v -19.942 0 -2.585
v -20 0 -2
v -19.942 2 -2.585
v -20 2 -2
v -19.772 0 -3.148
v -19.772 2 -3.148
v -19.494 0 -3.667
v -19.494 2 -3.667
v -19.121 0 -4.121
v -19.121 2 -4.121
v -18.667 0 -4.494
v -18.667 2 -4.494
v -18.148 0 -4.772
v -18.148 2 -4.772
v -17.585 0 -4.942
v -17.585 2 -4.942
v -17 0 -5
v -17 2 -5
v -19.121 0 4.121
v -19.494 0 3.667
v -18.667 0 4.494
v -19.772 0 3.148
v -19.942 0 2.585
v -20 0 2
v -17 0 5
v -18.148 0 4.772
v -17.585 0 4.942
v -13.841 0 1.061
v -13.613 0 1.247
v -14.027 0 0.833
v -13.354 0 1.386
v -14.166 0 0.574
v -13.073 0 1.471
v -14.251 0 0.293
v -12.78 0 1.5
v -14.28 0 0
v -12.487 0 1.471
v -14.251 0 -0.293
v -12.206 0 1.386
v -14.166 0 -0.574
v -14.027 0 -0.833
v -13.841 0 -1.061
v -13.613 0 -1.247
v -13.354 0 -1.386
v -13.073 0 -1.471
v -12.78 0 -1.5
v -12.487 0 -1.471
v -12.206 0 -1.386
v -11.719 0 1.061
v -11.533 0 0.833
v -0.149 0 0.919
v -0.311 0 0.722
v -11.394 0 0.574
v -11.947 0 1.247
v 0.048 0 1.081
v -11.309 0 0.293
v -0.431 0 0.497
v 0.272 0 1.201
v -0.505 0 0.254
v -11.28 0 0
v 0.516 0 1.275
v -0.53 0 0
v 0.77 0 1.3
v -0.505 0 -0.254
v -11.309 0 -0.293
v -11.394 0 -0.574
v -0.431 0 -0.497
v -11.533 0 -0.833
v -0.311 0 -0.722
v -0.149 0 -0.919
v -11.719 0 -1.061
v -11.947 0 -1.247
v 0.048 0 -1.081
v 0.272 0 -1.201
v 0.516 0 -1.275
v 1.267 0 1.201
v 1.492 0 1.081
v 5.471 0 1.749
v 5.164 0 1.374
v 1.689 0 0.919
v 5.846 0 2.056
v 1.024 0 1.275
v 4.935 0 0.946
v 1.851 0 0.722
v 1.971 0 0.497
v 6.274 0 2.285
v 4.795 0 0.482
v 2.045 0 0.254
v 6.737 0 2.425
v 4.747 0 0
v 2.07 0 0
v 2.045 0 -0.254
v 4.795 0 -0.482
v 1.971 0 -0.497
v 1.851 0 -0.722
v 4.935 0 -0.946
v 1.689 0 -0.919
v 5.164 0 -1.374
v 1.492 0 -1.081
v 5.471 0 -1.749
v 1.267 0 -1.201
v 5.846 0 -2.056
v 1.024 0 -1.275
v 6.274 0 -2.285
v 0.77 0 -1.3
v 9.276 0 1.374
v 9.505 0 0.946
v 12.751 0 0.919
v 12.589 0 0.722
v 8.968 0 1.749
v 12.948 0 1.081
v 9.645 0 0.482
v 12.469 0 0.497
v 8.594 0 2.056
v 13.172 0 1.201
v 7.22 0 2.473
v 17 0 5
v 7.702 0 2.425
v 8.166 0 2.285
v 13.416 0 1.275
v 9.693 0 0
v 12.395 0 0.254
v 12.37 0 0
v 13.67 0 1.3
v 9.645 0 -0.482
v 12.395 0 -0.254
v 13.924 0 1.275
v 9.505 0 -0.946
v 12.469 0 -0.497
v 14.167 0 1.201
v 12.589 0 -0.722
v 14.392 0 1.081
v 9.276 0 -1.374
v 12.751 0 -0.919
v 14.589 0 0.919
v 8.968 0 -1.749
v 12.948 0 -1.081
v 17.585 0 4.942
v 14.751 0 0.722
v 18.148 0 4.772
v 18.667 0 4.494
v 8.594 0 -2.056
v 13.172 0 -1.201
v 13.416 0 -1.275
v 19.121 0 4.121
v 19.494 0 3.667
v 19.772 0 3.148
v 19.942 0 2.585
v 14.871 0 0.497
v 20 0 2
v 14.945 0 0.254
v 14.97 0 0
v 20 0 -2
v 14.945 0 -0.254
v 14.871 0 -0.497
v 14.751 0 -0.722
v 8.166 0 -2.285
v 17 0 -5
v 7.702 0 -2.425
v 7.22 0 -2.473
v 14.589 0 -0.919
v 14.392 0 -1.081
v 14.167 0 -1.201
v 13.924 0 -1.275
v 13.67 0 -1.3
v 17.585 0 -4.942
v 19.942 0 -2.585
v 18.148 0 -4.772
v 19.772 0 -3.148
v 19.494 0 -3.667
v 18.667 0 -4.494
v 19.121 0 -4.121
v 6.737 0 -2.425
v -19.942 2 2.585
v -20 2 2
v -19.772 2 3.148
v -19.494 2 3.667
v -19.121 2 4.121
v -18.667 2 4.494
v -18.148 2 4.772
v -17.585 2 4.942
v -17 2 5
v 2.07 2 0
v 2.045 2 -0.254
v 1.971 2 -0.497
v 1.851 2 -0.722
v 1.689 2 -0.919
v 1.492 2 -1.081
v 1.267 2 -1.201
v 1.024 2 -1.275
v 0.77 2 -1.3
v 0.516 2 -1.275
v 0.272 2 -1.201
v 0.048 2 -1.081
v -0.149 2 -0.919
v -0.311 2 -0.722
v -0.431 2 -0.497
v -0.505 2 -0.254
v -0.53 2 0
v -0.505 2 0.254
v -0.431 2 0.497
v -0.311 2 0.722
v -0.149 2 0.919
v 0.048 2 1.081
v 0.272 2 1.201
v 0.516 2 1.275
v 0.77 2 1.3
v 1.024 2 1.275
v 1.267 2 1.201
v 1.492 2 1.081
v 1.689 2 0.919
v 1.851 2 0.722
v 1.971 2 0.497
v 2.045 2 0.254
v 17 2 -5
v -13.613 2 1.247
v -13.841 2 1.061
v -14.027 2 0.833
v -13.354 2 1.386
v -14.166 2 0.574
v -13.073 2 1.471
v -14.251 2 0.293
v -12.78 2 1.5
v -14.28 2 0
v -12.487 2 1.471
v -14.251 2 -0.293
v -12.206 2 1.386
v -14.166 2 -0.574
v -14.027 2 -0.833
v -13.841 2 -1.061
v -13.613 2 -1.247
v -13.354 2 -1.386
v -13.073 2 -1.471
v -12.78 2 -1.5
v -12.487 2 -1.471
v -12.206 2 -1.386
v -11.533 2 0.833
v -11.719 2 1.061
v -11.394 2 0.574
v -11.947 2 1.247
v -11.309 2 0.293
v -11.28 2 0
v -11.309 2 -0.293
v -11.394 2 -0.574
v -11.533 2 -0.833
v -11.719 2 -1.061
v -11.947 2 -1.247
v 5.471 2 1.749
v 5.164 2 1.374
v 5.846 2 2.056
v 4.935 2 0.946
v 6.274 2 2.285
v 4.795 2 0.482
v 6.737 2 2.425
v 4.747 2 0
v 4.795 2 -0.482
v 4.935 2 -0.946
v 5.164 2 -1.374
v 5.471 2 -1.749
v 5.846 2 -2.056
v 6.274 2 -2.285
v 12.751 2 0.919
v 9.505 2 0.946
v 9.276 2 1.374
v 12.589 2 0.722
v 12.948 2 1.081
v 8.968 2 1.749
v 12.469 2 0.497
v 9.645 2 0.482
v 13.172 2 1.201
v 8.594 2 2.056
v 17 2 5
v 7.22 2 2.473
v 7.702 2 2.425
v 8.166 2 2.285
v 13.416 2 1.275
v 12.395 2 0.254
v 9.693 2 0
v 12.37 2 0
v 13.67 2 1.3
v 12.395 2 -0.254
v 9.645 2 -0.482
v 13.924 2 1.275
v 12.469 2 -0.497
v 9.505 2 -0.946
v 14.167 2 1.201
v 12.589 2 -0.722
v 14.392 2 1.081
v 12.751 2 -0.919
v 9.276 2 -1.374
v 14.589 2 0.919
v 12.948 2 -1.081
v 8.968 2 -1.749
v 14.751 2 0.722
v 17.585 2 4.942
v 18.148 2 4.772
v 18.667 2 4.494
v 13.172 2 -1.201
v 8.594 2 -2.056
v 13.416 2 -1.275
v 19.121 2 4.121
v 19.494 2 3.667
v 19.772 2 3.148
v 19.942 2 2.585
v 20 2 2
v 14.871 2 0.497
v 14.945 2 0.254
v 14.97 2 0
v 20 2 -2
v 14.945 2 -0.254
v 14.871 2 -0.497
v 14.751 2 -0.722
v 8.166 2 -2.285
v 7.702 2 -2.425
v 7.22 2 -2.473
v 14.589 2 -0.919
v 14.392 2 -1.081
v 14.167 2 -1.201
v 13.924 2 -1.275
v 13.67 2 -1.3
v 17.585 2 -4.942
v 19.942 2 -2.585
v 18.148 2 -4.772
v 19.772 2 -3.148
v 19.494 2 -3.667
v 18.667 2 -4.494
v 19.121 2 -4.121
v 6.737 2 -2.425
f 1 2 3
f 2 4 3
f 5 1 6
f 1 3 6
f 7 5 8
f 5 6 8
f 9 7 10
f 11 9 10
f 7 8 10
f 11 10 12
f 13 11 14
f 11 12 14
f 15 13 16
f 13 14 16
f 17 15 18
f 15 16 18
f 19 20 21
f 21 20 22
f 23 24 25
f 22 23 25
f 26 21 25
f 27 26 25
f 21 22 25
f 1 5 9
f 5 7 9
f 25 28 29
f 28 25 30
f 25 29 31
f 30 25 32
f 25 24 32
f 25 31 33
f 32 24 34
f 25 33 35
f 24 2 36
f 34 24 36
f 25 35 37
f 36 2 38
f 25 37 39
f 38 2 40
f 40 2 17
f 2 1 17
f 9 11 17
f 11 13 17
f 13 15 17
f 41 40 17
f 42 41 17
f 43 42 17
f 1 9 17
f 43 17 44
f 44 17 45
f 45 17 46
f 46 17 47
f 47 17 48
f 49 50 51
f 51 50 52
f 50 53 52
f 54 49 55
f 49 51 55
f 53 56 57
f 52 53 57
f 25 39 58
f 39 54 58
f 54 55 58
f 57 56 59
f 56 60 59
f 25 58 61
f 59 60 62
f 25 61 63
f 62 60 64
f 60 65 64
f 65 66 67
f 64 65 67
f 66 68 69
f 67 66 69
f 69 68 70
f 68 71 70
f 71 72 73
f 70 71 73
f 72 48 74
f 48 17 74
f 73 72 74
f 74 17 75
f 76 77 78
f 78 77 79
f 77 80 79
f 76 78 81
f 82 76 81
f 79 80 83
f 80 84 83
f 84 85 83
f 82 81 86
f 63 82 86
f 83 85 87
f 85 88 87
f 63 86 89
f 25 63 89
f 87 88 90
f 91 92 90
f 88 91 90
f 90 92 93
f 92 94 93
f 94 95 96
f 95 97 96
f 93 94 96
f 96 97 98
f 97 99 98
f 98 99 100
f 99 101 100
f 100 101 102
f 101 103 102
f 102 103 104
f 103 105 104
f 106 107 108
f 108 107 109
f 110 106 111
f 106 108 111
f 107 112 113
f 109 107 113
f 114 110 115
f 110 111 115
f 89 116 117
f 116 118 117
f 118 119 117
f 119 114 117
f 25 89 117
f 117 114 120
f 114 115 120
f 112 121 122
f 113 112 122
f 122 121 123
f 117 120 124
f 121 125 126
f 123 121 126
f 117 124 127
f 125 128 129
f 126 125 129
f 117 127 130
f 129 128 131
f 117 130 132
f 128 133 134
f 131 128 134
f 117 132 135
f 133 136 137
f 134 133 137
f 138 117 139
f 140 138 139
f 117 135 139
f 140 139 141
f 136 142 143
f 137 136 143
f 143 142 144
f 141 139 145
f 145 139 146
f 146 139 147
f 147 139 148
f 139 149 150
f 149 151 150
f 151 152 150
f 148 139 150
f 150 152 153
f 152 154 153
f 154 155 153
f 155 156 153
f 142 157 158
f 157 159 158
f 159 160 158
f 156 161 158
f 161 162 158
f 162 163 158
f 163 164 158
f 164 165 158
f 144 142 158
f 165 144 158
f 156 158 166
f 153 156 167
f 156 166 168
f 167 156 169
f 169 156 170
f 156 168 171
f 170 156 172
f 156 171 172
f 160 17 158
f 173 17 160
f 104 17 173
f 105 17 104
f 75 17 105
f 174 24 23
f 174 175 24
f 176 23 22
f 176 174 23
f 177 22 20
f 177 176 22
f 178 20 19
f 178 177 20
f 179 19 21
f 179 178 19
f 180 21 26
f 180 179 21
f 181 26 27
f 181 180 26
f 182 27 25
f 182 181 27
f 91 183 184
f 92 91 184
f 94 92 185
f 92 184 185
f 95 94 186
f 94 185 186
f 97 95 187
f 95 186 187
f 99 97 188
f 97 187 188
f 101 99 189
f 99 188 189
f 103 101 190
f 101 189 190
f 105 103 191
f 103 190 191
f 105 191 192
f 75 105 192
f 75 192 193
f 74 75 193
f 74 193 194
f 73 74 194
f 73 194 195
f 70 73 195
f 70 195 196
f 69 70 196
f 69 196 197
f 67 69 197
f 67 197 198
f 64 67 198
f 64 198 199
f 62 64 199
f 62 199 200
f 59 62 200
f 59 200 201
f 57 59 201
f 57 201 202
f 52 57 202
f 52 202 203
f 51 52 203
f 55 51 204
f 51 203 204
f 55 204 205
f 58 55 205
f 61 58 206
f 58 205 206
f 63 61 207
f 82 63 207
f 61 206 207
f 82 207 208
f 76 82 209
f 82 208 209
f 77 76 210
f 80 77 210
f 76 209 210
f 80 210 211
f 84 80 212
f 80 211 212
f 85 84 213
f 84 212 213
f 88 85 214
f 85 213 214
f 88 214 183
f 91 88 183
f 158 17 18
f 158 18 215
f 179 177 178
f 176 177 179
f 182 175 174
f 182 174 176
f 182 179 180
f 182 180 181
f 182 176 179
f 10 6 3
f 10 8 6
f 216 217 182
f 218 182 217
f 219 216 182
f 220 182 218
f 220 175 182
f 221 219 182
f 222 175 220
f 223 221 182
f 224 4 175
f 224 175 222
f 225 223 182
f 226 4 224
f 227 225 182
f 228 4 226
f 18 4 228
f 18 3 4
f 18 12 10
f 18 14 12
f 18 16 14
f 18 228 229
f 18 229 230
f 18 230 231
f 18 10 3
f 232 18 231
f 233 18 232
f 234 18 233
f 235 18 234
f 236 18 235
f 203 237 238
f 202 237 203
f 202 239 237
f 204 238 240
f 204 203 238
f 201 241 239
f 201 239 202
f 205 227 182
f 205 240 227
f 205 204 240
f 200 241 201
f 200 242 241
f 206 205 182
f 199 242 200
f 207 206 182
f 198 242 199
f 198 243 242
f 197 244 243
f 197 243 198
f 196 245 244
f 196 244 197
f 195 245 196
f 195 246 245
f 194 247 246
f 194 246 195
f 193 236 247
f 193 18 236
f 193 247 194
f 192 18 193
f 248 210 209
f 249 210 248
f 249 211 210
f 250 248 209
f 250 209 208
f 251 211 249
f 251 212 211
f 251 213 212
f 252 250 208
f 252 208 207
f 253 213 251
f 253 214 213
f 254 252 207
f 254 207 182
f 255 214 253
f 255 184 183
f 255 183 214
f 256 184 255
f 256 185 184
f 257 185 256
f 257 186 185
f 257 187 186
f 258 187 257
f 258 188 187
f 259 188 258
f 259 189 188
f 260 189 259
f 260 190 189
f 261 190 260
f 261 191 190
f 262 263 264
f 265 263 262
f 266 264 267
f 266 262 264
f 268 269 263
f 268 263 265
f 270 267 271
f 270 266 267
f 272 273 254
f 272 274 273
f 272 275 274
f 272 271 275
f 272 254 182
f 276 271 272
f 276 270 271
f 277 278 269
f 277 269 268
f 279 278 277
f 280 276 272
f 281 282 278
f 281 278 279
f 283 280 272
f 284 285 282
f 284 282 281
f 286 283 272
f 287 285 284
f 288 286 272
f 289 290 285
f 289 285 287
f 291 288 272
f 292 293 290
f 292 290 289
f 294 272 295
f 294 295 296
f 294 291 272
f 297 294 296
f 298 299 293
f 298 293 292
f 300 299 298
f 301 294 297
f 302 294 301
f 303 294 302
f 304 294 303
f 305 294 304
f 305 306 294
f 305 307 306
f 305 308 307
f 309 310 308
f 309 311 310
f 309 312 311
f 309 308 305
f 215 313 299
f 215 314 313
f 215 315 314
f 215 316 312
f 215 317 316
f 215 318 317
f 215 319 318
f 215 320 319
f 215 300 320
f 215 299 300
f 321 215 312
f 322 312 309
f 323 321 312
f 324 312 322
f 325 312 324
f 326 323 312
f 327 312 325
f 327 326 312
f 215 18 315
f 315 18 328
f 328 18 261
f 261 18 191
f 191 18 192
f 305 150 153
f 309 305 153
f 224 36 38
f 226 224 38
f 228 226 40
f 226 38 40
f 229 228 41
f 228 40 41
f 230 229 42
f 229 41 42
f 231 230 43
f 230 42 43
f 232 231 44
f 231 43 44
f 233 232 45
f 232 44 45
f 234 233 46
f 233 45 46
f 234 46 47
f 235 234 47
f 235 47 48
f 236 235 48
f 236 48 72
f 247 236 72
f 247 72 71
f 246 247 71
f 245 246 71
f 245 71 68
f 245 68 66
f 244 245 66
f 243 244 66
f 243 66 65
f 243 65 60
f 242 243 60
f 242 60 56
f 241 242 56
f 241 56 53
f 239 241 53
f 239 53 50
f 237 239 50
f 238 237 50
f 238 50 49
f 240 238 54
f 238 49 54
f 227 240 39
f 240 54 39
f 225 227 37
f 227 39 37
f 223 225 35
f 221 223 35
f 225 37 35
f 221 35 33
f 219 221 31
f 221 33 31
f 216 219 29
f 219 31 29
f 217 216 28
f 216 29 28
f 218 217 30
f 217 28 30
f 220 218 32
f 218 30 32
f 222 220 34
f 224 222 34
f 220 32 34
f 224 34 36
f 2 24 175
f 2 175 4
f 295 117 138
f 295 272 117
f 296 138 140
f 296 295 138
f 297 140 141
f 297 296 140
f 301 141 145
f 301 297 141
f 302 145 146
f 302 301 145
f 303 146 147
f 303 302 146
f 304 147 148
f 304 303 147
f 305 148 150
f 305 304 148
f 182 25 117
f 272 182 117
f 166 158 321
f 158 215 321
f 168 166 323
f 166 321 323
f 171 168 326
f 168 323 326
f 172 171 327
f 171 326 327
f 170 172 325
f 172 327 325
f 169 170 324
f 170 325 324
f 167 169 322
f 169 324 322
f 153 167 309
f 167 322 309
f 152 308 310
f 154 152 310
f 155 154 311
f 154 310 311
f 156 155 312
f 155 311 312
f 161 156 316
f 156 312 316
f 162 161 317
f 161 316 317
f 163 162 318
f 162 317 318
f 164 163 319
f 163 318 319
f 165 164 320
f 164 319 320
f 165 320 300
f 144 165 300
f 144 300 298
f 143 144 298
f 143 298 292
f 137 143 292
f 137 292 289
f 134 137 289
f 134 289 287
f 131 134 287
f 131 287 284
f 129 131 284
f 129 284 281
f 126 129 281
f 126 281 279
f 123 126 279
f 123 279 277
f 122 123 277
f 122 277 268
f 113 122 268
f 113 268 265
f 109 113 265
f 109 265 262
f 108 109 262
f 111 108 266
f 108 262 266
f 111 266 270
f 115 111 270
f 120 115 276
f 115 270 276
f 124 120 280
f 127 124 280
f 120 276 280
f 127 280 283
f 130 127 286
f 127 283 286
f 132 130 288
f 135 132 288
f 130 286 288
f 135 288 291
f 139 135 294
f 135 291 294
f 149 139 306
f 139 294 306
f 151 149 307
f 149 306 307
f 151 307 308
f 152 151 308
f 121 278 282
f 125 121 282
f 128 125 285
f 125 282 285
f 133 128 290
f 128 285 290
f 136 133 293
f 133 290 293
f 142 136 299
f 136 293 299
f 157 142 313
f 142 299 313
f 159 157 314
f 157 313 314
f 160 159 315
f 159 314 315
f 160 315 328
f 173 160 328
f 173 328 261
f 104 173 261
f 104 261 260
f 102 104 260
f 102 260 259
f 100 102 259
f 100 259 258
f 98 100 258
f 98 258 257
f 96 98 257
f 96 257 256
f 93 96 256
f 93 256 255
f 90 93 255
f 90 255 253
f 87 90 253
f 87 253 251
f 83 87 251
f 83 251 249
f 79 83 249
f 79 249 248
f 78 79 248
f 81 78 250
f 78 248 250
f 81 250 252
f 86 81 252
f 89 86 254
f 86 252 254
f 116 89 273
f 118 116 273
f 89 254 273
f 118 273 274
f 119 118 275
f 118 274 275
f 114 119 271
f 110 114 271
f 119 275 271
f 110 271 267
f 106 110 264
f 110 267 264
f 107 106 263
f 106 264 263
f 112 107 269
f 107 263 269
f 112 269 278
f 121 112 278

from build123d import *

# Parameters (mm, degrees)
SKETCH1_W                = 40
SKETCH1_H                = 10
BOSS_EXTRUDE1_DEPTH      = 2
SKETCH2_R                = 2.472864358
SKETCH2_R_2              = 1.3
CUT_EXTRUDE1_DEPTH       = 3
FILLET1_R                = 3
F_3_0_3_DIAMETER_HOLE1_D = 3


with BuildPart() as part:
    # Sketch1 → Boss-Extrude1 (new body)
    with BuildSketch(Plane(origin=(0, 0, 0), x_dir=(1, 0, 0), z_dir=(0, 1, 0))):
        Rectangle(SKETCH1_W, SKETCH1_H)
    extrude(amount=BOSS_EXTRUDE1_DEPTH)

    # Sketch2 → Cut-Extrude1 (cut)
    with BuildSketch(Plane(origin=(0, 2, 0), x_dir=(1, 0, 0), z_dir=(0, 1, 0))):
        with Locations((7.219918586, 0)):
            Circle(SKETCH2_R)
        with Locations((13.669918586, 0)):
            Circle(SKETCH2_R_2)
        with Locations((0.769918586, 0)):
            Circle(SKETCH2_R_2)
    extrude(amount=-CUT_EXTRUDE1_DEPTH, mode=Mode.SUBTRACT)

    # Fillet1
    fillet1_edges = [part.edges().sort_by_distance(p)[0] for p in [
        (20, 1, 5),
        (-20, 1, 5),
        (-20, 1, -5),
        (20, 1, -5),
    ]]
    fillet(fillet1_edges, radius=FILLET1_R)

    # Ø3.0 (3) Diameter Hole1 (through all)
    with Locations(Plane(origin=(0, 2, 0), x_dir=(1, 0, 0), z_dir=(0, 1, 0))):
        with Locations((-12.780081414, 0)):
            Hole(F_3_0_3_DIAMETER_HOLE1_D / 2)


solid = part.part
